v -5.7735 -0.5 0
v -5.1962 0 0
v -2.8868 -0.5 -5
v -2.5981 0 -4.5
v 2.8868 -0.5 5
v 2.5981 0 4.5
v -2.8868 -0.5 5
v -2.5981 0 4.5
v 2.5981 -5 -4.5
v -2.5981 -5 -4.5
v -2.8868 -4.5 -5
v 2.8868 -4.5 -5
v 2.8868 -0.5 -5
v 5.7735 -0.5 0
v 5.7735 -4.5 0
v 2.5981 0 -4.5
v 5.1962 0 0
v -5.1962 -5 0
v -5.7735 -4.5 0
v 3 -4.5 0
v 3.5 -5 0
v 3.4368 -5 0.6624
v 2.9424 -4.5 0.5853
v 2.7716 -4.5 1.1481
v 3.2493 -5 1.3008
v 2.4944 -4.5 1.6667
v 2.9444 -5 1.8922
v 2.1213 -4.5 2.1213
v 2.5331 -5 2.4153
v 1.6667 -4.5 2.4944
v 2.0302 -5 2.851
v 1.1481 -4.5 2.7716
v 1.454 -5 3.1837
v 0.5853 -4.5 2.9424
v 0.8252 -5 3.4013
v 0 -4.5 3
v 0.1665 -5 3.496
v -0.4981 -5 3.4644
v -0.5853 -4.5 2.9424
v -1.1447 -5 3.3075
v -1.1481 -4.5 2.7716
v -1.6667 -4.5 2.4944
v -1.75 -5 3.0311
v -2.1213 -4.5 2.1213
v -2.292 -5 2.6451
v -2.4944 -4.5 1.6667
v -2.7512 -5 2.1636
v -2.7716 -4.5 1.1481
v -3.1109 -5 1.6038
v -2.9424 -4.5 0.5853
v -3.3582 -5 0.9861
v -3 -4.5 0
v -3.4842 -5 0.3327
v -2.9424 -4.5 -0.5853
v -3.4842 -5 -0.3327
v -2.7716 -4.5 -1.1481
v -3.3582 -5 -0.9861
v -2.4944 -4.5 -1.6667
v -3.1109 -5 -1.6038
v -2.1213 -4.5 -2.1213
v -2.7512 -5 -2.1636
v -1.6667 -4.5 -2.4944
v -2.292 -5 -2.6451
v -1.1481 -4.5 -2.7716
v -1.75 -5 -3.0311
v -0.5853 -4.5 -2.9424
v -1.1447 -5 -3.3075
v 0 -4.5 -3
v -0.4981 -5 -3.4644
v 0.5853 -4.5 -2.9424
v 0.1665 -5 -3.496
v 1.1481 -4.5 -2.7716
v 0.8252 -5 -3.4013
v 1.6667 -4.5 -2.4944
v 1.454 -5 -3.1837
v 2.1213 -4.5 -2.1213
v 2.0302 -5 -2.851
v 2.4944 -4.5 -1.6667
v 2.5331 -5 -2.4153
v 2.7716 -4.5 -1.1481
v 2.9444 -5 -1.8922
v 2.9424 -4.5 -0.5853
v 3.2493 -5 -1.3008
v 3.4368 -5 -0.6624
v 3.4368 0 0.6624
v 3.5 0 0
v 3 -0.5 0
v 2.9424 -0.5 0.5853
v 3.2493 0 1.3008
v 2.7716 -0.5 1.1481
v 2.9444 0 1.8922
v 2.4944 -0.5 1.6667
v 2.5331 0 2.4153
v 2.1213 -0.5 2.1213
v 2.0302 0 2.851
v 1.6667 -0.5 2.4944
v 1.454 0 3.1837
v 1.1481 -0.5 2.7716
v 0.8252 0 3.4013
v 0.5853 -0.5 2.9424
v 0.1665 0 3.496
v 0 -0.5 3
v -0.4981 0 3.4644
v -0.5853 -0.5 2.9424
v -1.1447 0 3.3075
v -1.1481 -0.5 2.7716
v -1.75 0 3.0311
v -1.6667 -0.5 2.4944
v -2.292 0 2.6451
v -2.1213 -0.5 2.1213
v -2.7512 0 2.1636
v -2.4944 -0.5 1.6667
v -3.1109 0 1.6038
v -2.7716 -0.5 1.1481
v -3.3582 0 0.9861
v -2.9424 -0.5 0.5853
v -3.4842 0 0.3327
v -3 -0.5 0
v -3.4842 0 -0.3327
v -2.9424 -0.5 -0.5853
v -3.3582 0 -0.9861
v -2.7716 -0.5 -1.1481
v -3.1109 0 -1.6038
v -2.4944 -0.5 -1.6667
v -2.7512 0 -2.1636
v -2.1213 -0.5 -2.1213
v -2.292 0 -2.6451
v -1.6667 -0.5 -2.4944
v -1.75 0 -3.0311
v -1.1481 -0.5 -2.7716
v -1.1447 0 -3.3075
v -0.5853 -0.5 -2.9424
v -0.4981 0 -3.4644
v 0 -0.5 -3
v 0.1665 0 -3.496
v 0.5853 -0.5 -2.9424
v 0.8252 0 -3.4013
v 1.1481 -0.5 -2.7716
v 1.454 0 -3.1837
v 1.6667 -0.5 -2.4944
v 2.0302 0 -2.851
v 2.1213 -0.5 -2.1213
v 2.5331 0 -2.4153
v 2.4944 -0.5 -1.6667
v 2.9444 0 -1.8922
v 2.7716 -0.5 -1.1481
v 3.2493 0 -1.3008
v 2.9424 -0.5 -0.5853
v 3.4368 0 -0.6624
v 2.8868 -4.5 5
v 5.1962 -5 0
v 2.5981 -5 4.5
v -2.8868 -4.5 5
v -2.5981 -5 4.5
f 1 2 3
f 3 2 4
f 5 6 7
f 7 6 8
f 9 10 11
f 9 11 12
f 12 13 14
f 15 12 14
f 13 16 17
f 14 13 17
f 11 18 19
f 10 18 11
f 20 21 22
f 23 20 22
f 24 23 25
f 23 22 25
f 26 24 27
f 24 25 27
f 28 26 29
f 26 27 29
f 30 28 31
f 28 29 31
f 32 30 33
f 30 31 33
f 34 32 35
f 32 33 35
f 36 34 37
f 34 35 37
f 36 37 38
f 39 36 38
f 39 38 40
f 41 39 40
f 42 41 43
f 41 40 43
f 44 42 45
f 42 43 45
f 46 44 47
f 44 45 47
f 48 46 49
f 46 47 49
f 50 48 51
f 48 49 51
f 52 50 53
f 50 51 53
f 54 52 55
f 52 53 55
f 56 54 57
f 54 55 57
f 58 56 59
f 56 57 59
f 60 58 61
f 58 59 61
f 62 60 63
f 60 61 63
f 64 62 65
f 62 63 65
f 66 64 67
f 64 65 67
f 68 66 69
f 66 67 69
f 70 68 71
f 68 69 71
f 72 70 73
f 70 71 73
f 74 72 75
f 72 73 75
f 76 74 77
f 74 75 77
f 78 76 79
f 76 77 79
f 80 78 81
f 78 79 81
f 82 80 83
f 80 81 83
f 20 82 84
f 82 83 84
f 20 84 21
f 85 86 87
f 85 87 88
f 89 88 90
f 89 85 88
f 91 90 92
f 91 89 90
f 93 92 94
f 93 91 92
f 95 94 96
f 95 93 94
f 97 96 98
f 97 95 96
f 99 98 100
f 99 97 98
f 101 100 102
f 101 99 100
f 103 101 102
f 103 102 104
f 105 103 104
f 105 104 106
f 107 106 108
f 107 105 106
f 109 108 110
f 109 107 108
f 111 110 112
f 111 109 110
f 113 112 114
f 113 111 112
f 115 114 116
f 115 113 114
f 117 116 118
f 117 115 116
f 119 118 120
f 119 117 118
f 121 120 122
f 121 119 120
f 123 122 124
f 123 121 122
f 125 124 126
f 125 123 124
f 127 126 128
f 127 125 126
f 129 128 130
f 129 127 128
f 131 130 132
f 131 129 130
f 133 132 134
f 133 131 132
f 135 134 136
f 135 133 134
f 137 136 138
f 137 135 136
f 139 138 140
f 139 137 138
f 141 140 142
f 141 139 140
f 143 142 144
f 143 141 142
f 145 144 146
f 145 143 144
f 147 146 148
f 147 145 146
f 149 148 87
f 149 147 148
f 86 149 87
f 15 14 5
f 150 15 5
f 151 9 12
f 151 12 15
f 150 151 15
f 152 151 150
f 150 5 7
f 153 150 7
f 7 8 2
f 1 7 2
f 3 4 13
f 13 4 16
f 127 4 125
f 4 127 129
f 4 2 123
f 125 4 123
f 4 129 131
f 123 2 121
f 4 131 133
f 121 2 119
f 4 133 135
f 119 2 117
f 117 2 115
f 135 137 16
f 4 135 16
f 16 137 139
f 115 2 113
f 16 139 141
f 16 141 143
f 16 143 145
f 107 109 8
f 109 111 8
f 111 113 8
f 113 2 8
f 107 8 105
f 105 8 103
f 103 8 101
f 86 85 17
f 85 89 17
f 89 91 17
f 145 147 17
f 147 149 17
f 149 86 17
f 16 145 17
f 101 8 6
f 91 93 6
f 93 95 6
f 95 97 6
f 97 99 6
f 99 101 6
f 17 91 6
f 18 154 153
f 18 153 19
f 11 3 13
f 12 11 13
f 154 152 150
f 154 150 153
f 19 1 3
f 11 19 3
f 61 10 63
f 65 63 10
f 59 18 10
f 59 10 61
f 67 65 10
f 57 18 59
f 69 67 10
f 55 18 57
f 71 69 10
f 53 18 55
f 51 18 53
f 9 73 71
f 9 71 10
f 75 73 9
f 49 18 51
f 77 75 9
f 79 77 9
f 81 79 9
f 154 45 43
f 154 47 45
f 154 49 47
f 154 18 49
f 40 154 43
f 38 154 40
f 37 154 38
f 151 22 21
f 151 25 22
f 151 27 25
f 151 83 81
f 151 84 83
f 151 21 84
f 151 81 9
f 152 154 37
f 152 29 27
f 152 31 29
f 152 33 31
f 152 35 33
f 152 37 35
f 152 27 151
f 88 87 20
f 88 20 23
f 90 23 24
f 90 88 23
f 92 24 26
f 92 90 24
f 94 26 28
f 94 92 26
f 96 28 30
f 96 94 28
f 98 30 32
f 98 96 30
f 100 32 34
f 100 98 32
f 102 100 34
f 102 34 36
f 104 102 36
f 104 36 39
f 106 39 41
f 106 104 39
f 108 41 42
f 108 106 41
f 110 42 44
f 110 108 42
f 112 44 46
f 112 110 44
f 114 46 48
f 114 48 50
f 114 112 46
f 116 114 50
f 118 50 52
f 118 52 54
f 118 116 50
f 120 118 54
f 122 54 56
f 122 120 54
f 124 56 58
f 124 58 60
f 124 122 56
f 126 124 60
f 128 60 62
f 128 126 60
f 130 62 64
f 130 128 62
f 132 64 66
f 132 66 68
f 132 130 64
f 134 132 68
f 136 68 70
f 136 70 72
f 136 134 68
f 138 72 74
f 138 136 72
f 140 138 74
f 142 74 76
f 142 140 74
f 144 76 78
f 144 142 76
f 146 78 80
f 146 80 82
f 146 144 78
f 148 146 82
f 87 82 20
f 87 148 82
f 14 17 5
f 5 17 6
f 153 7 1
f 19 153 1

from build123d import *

# Parameters (mm, degrees)
F0_R     = 3
F1_DEPTH = 5
F2_SIZE  = 0.5


with BuildPart() as f1:
    # F0 (on Front) → F1 (new body)
    with BuildSketch(Plane.XZ):
        Polygon((2.886751, 5), (-2.886751, 5), (-5.773503, 0), (-2.886751, -5), (2.886751, -5), (5.773503, 0), align=None)
        Circle(F0_R, mode=Mode.SUBTRACT)
    extrude(amount=F1_DEPTH)

    # F2
    f2_edges = [f1.edges().sort_by_distance(p)[0] for p in [
        (4.330127, -5, 2.5),
        (0, -5, 5),
        (-4.330127, -5, 2.5),
        (-4.330127, -5, -2.5),
        (0, -5, -5),
        (4.330127, -5, -2.5),
        (-3, -5, 0),
        (4.330127, 0, 2.5),
        (0, 0, 5),
        (-4.330127, 0, 2.5),
        (-4.330127, 0, -2.5),
        (0, 0, -5),
        (4.330127, 0, -2.5),
        (-3, 0, 0),
    ]]
    chamfer(f2_edges, length=F2_SIZE)


solid = f1.part
